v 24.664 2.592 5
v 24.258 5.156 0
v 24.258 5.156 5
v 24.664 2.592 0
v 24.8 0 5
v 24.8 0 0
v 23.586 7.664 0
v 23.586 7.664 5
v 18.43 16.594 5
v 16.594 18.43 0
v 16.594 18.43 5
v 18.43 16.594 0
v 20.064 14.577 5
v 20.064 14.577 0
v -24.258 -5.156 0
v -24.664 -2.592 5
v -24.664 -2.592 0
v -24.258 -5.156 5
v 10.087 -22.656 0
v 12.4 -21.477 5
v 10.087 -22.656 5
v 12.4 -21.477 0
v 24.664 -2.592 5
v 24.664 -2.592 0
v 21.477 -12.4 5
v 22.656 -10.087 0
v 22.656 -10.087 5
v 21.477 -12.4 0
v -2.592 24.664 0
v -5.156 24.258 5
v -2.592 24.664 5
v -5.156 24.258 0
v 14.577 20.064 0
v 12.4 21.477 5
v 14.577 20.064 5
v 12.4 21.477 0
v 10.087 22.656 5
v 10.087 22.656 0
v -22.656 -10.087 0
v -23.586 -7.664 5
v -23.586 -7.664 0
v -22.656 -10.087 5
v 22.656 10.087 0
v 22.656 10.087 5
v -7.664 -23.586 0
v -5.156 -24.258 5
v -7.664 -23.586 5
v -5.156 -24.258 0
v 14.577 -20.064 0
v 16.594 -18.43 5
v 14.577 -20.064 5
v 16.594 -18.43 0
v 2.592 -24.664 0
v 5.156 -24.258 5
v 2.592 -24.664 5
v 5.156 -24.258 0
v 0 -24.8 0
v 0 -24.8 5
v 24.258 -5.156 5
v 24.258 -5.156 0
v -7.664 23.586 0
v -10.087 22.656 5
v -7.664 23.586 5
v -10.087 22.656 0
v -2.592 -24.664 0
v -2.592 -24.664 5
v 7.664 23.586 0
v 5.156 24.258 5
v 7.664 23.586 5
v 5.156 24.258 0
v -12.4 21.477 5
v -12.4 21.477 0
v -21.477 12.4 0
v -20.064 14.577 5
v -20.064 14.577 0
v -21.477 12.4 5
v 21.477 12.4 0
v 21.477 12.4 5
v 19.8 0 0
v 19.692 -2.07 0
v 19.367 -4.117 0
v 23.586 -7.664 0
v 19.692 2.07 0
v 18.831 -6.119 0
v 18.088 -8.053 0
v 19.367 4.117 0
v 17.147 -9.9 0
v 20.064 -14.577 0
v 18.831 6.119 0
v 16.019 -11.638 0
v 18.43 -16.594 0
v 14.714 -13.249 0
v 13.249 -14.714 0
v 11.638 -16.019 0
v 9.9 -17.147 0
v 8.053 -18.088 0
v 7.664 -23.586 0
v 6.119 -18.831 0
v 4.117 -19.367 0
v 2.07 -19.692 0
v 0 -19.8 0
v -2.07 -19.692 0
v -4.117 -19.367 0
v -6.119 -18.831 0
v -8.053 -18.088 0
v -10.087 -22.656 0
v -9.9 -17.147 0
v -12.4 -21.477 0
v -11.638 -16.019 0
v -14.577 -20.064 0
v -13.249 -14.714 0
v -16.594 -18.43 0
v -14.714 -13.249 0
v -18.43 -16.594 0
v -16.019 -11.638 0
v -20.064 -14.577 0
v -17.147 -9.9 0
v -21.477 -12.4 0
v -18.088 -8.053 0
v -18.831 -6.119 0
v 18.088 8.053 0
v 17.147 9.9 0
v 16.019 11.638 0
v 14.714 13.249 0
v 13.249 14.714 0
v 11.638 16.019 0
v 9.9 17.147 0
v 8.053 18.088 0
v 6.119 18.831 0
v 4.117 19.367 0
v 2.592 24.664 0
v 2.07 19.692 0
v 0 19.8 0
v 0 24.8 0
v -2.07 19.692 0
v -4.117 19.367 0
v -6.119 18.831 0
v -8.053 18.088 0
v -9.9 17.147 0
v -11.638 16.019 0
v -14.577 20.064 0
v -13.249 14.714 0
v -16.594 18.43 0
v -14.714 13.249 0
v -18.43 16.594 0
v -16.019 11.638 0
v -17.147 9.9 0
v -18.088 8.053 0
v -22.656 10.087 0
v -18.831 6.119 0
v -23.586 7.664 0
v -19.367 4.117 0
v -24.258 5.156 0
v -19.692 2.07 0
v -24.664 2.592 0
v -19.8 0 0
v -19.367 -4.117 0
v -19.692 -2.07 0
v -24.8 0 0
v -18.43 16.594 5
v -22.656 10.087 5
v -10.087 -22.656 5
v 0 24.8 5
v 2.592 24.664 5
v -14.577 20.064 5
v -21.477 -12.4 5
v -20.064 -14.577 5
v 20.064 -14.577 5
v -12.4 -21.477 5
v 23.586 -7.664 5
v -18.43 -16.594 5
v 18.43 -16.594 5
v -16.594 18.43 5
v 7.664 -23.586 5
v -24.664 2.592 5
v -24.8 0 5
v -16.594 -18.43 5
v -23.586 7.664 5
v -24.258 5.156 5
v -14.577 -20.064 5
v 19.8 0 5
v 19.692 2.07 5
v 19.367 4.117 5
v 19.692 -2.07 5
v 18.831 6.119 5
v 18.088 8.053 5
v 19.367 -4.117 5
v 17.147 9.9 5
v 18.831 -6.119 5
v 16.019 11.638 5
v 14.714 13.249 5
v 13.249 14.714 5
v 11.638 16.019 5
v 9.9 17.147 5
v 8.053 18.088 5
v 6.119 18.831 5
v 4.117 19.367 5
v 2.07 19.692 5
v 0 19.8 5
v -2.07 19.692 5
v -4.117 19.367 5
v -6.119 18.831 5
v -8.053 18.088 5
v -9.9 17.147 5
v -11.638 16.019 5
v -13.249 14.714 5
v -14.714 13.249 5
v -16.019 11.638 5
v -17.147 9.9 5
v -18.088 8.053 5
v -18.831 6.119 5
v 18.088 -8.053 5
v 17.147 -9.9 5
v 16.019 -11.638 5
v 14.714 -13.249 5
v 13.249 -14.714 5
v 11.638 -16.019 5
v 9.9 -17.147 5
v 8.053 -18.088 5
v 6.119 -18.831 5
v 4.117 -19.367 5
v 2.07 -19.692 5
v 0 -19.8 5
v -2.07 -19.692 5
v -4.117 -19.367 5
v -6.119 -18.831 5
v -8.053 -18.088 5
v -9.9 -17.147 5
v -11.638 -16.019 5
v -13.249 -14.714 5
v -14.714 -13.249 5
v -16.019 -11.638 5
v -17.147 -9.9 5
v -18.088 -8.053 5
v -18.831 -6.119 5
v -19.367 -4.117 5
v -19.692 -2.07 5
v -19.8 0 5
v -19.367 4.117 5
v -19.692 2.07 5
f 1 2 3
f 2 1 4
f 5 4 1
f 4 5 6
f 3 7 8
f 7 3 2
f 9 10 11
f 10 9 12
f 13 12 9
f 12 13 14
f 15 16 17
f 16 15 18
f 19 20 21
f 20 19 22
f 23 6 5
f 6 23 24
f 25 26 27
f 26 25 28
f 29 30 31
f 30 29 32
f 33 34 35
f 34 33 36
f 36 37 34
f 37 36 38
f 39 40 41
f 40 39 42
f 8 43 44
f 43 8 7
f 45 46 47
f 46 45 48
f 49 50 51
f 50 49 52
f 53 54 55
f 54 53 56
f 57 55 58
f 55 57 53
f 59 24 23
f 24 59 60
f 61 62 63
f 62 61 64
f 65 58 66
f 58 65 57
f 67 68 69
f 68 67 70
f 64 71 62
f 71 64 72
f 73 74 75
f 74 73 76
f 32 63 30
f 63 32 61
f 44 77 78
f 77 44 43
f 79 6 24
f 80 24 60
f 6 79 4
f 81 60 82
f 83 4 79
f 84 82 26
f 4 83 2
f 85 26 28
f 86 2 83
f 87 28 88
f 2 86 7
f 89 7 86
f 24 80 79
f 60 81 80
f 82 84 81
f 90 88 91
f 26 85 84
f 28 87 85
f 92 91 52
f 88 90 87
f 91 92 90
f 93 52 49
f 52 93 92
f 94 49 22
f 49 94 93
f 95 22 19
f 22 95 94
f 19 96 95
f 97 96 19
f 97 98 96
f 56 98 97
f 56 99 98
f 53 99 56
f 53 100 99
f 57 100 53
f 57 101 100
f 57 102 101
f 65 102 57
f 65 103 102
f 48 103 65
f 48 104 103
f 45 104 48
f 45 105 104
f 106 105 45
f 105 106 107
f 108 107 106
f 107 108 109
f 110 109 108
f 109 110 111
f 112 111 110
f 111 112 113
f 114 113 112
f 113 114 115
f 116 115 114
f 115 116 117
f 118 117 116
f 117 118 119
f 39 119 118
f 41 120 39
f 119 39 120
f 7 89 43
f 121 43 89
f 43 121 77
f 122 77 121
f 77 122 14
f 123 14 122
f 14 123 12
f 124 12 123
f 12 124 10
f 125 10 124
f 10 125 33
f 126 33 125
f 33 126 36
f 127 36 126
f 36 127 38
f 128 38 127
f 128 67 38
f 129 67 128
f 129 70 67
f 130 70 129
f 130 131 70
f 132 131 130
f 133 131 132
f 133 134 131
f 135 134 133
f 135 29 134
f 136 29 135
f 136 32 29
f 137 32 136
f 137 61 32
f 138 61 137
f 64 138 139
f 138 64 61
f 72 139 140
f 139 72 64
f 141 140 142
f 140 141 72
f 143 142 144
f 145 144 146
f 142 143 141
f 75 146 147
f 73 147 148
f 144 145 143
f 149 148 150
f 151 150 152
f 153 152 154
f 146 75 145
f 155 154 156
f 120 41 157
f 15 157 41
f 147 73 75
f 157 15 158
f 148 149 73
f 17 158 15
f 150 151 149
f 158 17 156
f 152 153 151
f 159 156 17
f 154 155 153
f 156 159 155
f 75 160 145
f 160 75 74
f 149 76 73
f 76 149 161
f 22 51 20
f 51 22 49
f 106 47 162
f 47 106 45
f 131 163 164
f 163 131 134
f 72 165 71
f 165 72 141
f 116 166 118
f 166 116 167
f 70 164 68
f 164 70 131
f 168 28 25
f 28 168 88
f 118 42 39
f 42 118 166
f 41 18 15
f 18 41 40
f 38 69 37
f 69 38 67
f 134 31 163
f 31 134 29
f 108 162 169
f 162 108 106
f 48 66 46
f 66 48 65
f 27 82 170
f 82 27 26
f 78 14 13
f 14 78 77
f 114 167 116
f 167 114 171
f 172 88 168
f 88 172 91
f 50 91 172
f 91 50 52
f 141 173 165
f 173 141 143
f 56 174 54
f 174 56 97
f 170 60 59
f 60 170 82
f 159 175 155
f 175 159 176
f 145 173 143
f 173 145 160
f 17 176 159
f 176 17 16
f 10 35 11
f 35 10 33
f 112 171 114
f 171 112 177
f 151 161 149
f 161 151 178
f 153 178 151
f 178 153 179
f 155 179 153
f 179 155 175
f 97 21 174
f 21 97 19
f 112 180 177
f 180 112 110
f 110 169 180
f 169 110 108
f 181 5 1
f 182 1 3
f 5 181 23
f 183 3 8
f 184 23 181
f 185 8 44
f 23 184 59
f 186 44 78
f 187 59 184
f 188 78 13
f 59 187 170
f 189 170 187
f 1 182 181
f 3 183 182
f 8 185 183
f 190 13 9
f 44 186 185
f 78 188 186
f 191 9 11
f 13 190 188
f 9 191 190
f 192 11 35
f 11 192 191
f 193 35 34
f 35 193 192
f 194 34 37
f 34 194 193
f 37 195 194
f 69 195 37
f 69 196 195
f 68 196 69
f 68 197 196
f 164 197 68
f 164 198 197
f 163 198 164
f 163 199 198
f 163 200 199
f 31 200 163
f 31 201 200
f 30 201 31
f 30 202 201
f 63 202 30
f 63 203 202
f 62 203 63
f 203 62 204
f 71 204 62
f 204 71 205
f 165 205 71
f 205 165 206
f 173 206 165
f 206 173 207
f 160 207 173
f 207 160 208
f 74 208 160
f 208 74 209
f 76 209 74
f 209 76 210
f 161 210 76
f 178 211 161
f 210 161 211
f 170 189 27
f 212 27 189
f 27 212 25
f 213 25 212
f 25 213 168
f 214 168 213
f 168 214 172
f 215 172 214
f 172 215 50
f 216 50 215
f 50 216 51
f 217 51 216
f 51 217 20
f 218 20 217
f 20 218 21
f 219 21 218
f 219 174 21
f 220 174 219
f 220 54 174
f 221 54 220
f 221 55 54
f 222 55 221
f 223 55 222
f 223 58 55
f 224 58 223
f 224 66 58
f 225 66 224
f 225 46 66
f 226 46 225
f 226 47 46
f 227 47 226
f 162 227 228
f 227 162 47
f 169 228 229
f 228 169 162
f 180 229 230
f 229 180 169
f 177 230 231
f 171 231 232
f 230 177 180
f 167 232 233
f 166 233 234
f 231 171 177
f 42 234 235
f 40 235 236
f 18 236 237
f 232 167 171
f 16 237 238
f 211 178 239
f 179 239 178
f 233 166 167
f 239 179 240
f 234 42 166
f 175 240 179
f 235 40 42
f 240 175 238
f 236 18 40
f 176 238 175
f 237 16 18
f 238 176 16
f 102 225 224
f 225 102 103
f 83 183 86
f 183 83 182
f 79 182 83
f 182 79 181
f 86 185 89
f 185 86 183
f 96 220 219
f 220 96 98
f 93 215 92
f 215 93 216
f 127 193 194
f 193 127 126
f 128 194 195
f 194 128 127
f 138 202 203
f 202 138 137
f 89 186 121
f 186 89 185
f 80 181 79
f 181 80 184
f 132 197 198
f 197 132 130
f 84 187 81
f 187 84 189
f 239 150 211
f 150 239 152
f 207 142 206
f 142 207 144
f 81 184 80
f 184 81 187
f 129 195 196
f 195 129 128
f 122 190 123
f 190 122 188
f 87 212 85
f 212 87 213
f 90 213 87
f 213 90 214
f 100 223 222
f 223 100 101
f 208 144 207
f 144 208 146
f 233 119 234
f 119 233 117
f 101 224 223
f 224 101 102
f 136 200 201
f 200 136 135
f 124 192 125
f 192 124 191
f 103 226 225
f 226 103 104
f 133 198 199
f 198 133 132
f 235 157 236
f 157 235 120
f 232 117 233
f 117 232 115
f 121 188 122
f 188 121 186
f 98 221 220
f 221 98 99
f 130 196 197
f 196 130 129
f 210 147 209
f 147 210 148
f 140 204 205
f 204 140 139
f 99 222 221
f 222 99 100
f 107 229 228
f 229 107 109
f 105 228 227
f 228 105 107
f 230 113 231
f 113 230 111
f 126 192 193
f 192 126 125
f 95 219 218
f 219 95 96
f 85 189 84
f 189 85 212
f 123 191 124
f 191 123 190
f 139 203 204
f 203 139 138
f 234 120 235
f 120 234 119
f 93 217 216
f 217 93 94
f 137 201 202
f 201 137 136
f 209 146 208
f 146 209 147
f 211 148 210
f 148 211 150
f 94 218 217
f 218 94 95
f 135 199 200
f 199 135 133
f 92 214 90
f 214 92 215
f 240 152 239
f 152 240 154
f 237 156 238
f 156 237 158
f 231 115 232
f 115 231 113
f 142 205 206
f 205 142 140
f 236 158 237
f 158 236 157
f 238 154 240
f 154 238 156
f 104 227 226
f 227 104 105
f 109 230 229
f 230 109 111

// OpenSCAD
// file: SaugschlauchAdapter.scad
// tube inner diameter (mm)
tube_inner = 15.2;

// tube outer diameter (mm)
tube_outer = 20.2;

// diffusor/tube overlap (mm)
tube_overlap = 30;

// diffusor/tube wing length (mm)
tube_wing_length = 20;

// hose inner diameter (mm)
hose_inner = 32;

// hose outer diameter (mm)
hose_outer = 49.4; // 39;

// hose adaptor length (mm)
hose_adaptor_length = 37;

hose_adaptor_ridge_width = 39;
hose_adaptor_ridge_height = 2;


// diffuser angle (°)
alpha = 10;

/* [Hidden] */
$fn = 60;

diffuser_length = (hose_inner - tube_inner) / tan(alpha);
echo(diffuser_length);

module hose() {
    difference() {
        union() {
            cylinder(d=34, h=30);
            for (i = [0:5]) {
                translate([0, 0, 5*i]) {
                    cylinder(d=39, h=1.6);
                    translate([0, 0, 2.5]) cylinder(d=35, h=1.6);
                }
            }
        }
        cylinder(d=32, h=30);
    }
}

module tube() {
    translate([0, 0, -60]) difference() {
        cylinder(d=20, h=60);
        cylinder(d=15, h=60);
    }
}

module diffuser() {
    difference() {
        union() {
            translate([0, 0, -tube_overlap]) {
                cylinder(
                    d1 = tube_outer + 2*0.8,
                    d2 = hose_outer,
                    h = diffuser_length
                        + tube_overlap
                        - hose_adaptor_length
                        + hose_adaptor_ridge_height
                );
                translate([0, 0, -tube_wing_length]) {
                    for (phi = [0:120:240]) {
                        rotate([0, 0, phi])
                        rotate_extrude(angle = 60) {
                            translate([tube_outer/2, 0, 0])
                            square([0.8, tube_wing_length]);
                        }
                    }
                }
                translate([0, 0, diffuser_length
                    + tube_overlap
                    - hose_adaptor_length
                    + hose_adaptor_ridge_height]) {
                    cylinder(d = hose_outer, h = hose_adaptor_length);
                }
            }
        }
        union() {
            cylinder(d1=tube_inner, d2=hose_inner, h=diffuser_length);
            translate([0, 0, -tube_overlap]) {
                cylinder(d=tube_outer, h=tube_overlap);
            }
            translate([0, 0, diffuser_length]) {
                cylinder(d = hose_adaptor_ridge_width, h = hose_adaptor_ridge_height);
            }
        }
    }
}

module diffuser_adjusted() {
    translate([0, 0, diffuser_length + hose_adaptor_ridge_height]) rotate([180]) diffuser();
}

//%hose();
translate([0, 0, -diffuser_length - hose_adaptor_ridge_height]) {
    %tube();
    diffuser();
}
// main file
use <SaugschlauchAdapter.scad>

outer_width = 49;
ridge_width = 39;
inner_width = 32;
ridge_height = 2;
length = 37;

$fn = 60;


module probe() {
    polygon([
        [0, 0],
        [outer_width/2, 0],
        [outer_width/2, length],
        [ridge_width/2, length],
        [ridge_width/2, length - ridge_height],
        [inner_width/2, length - ridge_height],
        [inner_width/2, length + 10],
        [0, length + 10],
        [0, length + 5],
        [inner_width/2 - 5, length + 5],
        [inner_width/2 - 5, length - ridge_height - 5],
        [outer_width/2 - 5, length - ridge_height - 5],
        [outer_width/2 - 5, 5],
        [0, 5],
    ]);
}

//linear_extrude(2) {
//    probe();
//    mirror([1, 0, 0]) probe();
//}


//translate([0, -20, 4]) intersection() {
//    cube([40, 40, 8], center = true);
//    rotate([180, 0, 0]) diffuser();
//}

//translate([0, 25, 0]) intersection() {
//    translate([0, 0, 4]) cube([60, 60, 8], center = true);
//    diffuser_adjusted();
//}

module ring(d) {
    difference() {
        cylinder(d = d, h = 5);
        cylinder(d = d - 10, h = 5);
    }
}

//translate ([ 26, 0, 0]) ring(49);
//translate ([-26, 0, 0]) 
ring(49.6);
